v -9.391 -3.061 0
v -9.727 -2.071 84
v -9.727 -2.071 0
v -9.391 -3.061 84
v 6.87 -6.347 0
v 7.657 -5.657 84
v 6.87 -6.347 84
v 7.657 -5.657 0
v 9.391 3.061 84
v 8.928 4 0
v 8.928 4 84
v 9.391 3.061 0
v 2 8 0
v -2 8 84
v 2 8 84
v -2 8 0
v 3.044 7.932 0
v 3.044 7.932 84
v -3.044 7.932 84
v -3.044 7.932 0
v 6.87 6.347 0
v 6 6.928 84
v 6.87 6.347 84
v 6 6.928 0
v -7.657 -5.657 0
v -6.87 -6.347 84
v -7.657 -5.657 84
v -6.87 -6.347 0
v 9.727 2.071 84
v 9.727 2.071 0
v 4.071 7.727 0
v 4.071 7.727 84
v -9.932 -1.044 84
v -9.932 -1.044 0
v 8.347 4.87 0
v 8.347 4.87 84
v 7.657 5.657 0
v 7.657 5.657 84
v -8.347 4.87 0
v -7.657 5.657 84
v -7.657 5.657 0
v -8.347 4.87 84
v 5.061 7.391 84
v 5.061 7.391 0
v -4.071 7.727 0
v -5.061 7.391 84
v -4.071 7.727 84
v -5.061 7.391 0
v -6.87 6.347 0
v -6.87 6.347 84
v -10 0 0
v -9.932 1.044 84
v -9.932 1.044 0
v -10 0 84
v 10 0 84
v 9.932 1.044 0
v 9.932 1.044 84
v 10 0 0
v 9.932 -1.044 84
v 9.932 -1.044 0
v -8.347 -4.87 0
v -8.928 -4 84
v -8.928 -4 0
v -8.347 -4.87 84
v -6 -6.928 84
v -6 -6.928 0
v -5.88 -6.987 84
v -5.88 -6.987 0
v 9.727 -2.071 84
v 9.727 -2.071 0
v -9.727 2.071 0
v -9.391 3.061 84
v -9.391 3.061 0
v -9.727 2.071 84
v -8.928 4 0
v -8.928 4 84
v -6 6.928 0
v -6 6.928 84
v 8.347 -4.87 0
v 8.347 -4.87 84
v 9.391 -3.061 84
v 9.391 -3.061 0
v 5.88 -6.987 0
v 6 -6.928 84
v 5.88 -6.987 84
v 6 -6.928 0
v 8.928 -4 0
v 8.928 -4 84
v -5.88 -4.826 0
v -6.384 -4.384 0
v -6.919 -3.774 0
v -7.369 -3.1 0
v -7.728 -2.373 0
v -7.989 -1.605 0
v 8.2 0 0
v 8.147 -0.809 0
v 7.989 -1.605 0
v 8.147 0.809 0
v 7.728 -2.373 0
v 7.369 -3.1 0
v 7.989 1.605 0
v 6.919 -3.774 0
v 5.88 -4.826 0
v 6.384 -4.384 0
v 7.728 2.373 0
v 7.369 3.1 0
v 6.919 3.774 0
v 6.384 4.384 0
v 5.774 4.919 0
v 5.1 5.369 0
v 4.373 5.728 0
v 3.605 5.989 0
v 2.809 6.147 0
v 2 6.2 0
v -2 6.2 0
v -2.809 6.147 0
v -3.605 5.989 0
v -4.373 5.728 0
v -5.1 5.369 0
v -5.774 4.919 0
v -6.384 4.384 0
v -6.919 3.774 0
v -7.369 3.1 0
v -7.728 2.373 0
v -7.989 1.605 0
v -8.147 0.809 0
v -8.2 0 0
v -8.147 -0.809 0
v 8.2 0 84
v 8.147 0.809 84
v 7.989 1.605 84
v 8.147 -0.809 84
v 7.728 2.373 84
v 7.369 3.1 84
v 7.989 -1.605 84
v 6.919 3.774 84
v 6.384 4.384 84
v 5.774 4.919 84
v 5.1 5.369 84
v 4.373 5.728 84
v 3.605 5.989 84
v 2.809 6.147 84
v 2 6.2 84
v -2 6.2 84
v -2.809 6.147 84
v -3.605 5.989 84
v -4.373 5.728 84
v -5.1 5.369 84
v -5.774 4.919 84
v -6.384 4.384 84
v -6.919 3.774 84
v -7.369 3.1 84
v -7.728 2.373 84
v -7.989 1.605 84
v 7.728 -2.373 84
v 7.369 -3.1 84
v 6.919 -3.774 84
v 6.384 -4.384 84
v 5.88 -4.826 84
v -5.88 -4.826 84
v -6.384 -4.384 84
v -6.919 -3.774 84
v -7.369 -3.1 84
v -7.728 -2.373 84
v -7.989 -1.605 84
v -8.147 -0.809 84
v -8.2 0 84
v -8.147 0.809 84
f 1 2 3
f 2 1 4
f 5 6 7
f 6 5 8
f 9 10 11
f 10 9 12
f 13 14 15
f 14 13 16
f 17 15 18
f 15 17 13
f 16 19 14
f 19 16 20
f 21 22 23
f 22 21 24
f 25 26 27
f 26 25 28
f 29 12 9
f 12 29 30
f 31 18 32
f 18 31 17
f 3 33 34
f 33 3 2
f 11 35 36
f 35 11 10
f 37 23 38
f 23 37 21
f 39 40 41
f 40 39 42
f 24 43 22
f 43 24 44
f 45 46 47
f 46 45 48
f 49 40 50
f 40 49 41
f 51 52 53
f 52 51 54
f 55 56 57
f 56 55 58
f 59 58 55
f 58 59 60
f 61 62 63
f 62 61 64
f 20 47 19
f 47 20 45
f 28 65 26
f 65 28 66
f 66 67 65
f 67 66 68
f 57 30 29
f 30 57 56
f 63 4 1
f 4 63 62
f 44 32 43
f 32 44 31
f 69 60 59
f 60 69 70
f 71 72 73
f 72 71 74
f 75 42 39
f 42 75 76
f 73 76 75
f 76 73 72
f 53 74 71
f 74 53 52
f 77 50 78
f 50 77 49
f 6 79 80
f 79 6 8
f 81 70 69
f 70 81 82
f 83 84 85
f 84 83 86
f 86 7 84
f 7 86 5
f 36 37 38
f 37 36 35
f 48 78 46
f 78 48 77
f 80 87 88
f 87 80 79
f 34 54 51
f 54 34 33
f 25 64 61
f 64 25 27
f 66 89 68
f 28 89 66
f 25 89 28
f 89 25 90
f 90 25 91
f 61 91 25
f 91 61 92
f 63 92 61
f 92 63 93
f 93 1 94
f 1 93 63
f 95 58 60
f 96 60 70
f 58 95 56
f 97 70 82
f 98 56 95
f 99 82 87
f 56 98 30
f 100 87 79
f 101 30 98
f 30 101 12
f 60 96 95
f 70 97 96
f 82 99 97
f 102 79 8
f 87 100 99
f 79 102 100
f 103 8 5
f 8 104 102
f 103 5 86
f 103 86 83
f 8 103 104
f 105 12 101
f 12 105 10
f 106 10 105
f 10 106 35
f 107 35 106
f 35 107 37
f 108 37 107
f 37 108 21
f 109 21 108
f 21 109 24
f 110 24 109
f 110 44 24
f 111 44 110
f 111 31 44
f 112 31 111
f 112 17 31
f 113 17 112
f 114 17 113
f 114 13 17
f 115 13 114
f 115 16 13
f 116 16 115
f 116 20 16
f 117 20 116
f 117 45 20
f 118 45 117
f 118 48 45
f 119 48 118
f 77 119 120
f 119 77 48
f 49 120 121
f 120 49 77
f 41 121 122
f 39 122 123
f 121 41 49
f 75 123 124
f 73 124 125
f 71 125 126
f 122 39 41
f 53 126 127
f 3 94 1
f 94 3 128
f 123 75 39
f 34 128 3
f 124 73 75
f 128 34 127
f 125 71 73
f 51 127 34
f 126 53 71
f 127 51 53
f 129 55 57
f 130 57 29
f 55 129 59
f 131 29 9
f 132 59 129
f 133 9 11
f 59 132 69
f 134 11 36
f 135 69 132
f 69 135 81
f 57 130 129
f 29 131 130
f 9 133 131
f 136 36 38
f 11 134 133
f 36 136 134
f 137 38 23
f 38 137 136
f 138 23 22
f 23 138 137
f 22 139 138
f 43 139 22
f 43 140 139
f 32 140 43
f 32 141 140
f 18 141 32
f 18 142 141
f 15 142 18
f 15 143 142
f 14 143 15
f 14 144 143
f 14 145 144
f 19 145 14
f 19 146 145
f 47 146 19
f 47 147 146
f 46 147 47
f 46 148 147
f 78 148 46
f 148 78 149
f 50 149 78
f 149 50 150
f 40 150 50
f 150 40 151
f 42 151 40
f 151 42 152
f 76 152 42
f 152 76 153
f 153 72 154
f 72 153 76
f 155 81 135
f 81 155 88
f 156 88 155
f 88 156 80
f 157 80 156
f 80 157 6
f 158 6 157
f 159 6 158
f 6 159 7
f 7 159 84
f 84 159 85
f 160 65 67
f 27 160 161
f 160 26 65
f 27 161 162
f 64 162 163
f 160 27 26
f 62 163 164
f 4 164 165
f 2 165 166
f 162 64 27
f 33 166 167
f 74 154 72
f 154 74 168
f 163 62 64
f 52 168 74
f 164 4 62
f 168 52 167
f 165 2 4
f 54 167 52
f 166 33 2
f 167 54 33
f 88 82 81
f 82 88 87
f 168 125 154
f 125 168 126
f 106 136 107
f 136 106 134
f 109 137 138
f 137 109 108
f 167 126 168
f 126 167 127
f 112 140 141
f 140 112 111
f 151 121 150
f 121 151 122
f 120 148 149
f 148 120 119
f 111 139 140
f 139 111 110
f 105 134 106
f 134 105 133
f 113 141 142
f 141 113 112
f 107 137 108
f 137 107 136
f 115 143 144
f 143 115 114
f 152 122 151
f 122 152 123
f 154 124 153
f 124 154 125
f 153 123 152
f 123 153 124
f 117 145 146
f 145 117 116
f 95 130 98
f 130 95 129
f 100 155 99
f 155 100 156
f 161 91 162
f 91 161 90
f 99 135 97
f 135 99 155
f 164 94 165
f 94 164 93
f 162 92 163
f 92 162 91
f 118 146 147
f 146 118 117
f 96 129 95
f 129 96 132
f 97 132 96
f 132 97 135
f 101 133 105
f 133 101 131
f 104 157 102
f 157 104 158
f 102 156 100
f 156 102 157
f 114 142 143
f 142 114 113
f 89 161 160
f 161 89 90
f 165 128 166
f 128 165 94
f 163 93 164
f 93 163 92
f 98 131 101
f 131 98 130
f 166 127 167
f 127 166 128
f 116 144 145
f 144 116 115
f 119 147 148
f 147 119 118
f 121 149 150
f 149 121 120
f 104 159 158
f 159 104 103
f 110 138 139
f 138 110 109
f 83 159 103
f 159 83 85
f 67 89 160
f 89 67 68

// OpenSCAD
// file: params.scad
// ==================== source of truth ====================
// Every number below is cross-referenced to either this repo's own simulation
// model (src/robot_cat_description/urdf/cat.urdf.xacro at scale 1.0, and
// robot_cat_gait/leg_ik.py) or to a measurement of a real CAD file - see
// hardware/cad/measure/README.md for the method, the sources and the raw
// numbers.
//
// Nothing here is a guess any more. The two values that used to be flagged
// ADJUSTABLE (the horn bolt circle and a downloaded bracket's flange) were
// replaced by measurements taken off the official STS3215 STEP model, so the
// downloaded bracket is no longer on the critical path at all.

// ---- leg geometry - VERIFIED, must match leg_ik.py exactly ----
thigh_length = 110;   // LegGeometry.thigh_length, axis to axis
calf_length  = 110;   // LegGeometry.calf_length, axis to paw centre
hip_offset   = 25;    // hip roll axis -> thigh pitch axis, lateral
foot_radius  = 12;    // paw pad sphere radius

// ---- trunk geometry - VERIFIED ----
hip_x = 110;          // hip mount, x from body centre (so 220mm hip-to-hip)
hip_y = 55;           // hip mount, y from body centre (so 110mm hip-to-hip)
body_length = 300;
body_width  = 111;
body_height = 141;

// ---- ST3215 / STS3215 servo - MEASURED from the official CAD model
// (TheRobotStudio/SO-ARM100, STEP/SO100/STS3215_03a.step). The shop pages'
// "45.2 x 24.7 x 35" is the CASE only; the model bounding box is 39.6 deep
// because the output boss and the idler boss stand proud of it. Pocket depth
// must use servo_h, clearance above it must allow for servo_boss. ----
servo_l = 45.4;
servo_w = 24.8;
servo_h = 35.4;        // case alone, faces at +/-17.7 from centre
servo_boss_h = 2.3;    // output boss above the case face
servo_boss_d = 22.1;   // raised collar around the output axis, +0.1 clearance
servo_axis_x = 12.5;   // output axis offset from the servo's own centre,
                       // i.e. 10.2mm in from the near end face
servo_fit = 0.4;       // FDM clearance added per side around the pocket

// ---- Raspberry Pi 5 mounting - VERIFIED against the official Raspberry Pi
// Ltd mechanical drawing (RP-008347-DS-1): 58 x 49mm hole spacing, Ø2.7mm
// holes (clearance for M2.5) ----
pi_hole_x = 58;
pi_hole_y = 49;
pi_hole_d = 2.9;       // add a touch over the datasheet 2.7 for FDM tolerance

// ---- servo horn bolt circle - MEASURED, exact
// Four holes, all on ONE circle of radius 7.000mm (diameter 14.00), at 45,
// 135, 225 and 315 degrees - a square of side 9.90mm. Least-squares circle
// fit to the STEP model's analytic CIRCLE entities, residual 0.000mm.
//
// The earlier "three holes at 6.7, one at 5.6" here was wrong. It came from
// misreading OpenRoboticDog's hip_x4.stl, which has no horn circle at all -
// those were the servo's case screws. See measure/README.md.
horn_bolt_r = 7.0;
horn_bolt_d = 2.7;         // M2.5 clearance, model bore is 2.5
horn_hub_d = 9.2;          // Ø9.0 hub on the horn face, +0.2 clearance

// ---- servo case screw positions - MEASURED
// The four screws that hold the servo case together double as mounting
// points: this is how OpenRoboticDog fixes the servo to its frame, and that
// part measures 3.75mm apart against this model's 3.8mm. Positions are given
// relative to the servo centre, on both flanks at y = +/-10.25.
case_screw_y = 10.25;
case_screw_x = [4.2, -16.5, -20.3];
case_screw_d = 2.2;        // M2 clearance; the servo's own bore is 1.5 pilot

// Two of the three are enough to fix a servo, and OpenRoboticDog uses two.
// Which two matters here: taking the pair NEAREST the output axis keeps a
// mounting pad 35mm long instead of 45mm, which is what lets the trunk frame
// stay inside the 300mm body. The outermost screw stays available if a part
// wants all three.
case_screw_x_used = [4.2, -16.5];

// ---- leg segment spines ----
// The rectangular bar between a segment's two end plates. Declared here
// because FOUR files need it and only agreement makes them fit: the segment
// itself, and the cosmetic fairing that snaps over it. A comment saying
// "must match" is not a mechanism.
thigh_spine = [14, 10];
calf_spine  = [12, 9];

// ---- print structure ----
wall = 4;             // load-bearing wall thickness in PETG
insert_d = 4.2;        // M3 brass heat-set insert bore
insert_depth = 6;
$fn = 48;
// file: shell_params.scad
// ==================== cosmetic layer ====================
// The skin. Everything here is APPEARANCE, deliberately kept in its own file
// and its own namespace so that nothing structural can be changed by tuning
// how the cat looks. params.scad carries the numbers the gait and the torque
// budget depend on; this file must read them and never contradict them.
//
// The one hard constraint the skin has to respect was measured, not guessed:
// sweeping every pose the robot actually commands (walk at 0.10 m/s, full
// turn, stand, stretch, lie down), the nearest any leg part comes to the
// centreline is |y| = 84.6mm, against a body half-width of 55.5mm. That is
// 29mm of clearance, so a full-width skin never touches a leg. Only the four
// hip joints pierce it. Re-run measure/envelope.py after any gait change.

include <params.scad>

// ---- skin ----
skin = 1.8;           // cosmetic wall. Not load bearing - the ladder frame
                      // carries everything. 1.8 is three 0.6 extrusions.
seam_gap = 0.25;      // clearance on a shell-to-shell mating face
clip_d = 3.2;         // magnet / M3 boss for holding panels on

// ---- body ----
// Half-width comes straight from body_width so the skin can never quietly
// outgrow the box the torque was computed on. The vertical scale turns the
// circular stations below into the cat's egg-shaped cross-section: taller
// than wide, which montaz.pdf calls out as the thing to preserve.
body_hw = body_width / 2;              // 55.5
body_hh = body_height / 2;             // 70.5
body_z_scale = body_hh / body_hw;      // 1.27

// Stations along the spine: [x, radius, z-lift]. Radius is in circular
// space, BEFORE the vertical scale; lift is in real mm, after it. The shape
// comes mostly from the radius profile - the lifts only tilt the ends up.
//
// These are sphere CENTRES, not points on the surface: a station puts skin
// at x +/- r, not at x. Sizing them as if they were surface points is what
// makes a 300mm body come out 356mm long, so every station is checked
// against the box by measure/fit_check.py. Run it after touching this list.
// The box is 300 x 111 x 141 because that is what the torque budget and the
// gait were computed on, and the skin has to stay inside it.
body_stations = [
    [-124,  26,  12],   // tail root, lifted so the tail leaves upward
    [-106,  44,   6],   // rump, just behind the rear hips
    [ -70,  52,   1],   // waist - the shallowest part of the back
    [   0,  54.5,  0],  // midpoint
    [  70,  54.5, -1],  // ribcage, the deepest part of a cat
    [ 102,  47,   2],   // shoulder
    [ 120,  30,  12],   // base of the neck
];

// Where the skin is cut into printable pieces. The seam runs along the flank
// exactly at the hip axis (z=0 in the urdf's base_link). That is the widest
// line on the body, which makes it the one place a panel line can run
// straight without wandering across a curve - and it means each hip opening
// is a clean half-circle shared between the top and bottom panel, so either
// can be lifted off without threading it over a leg.
flank_seam_z = 0;
body_split_x = 0;     // fore/aft print split, keeps each panel under 155mm

// The urdf hangs neck_pan_joint and tail_joint off the CORNERS of the
// collision box, at z = +70.5. A rounded skin cannot reach a box corner, and
// nothing in the mass or torque budget depends on where those two decorative
// links attach - neck_mass is deliberately near-zero and the tail is trim.
// So the real pivots go where the skin actually is, and the numbers are
// stated here rather than left to be discovered with a printed part in hand.
neck_pivot = [138, 0, 30];
neck_rise = 34;       // degrees the neck leaves the chest at
neck_reach = 34;      // pivot to head centre, along that neck axis
head_droop = 8;       // nose-down at rest, which is how a cat holds it
tail_pivot = [-148, 0, 34];
tail_rise = 51.6;     // degrees above horizontal, matches the urdf's rpy

// ---- head ----
// Sized off the body, not invented: a domestic cat's skull is about 60% of
// the chest width across the cheeks. The muzzle is short and the eyes sit
// forward, which is most of what makes a face read as feline rather than
// canine.
// 72mm across a 109mm body is 66% - the proportion the reference render
// has. At 60% the head reads as a bird's; much over 70% and it reads as a
// kitten's.
head_w = 72;
head_h = 66;
head_l = 84;

eye_d = 15;           // outer lens/bezel diameter
eye_spacing = 34;     // centre to centre - 52% of head width, which is the
                      // proportion that reads as a cat rather than a fox
eye_x = 16;           // forward of the head centre
eye_z = 6;            // above the head centre
eye_toe_in = 12;      // degrees each eye is splayed outward

// Camera Module 3 board, from the Raspberry Pi mechanical drawing: 25 x 24mm
// board, 12.5mm lens barrel. It sits behind ONE eye - the other socket takes
// the IR illuminator, per plan-zakupowy.pdf.
cam_board = [25, 24, 11.5];
cam_bore_d = 16;

ear_h = 32;
ear_w = 29;
ear_t = 3.6;
ear_splay = 20;       // degrees outward from vertical
ear_x = -6;           // behind the head centre
ear_spacing = 40;
// Where the ear's own origin sits on the skull. head_upper cuts its socket
// with the same transform, so the socket and the plug cannot drift apart.
ear_seat_z = 26;

// Where the head splits. head_upper and head_lower both cut on this plane
// from opposite sides, so it has to be one number, not two that agree.
head_split_z = -6;
ear_tang = 13;

// ---- legs ----
// The round disc over every joint is the strongest visual signature in the
// reference image, and it is nearly free: it hides the horn screws and the
// gap between segments. Diameter follows the servo's own collar so it always
// looks deliberate.
cap_d = servo_boss_d + 12;      // 34.1
cap_h = 4.5;

fairing_gap = 1.2;    // clearance between a fairing and the segment inside it

// ---- tail ----
// Segments thread onto a single 2mm steel wire or a spring, tapering from
// root to tip. Eleven of them over 190mm reads as a cat tail; fewer looks
// like an antenna. The tail is driven by one microservo at the root, so the
// segments themselves are passive and only need to be light.
tail_n = 11;
tail_len = 190;
tail_root_d = 17;
tail_tip_d = 8;
tail_bore_d = 2.6;    // 2mm wire plus fit

// ---- neck ----
neck_d = 34;
neck_len = 26;
// main file
// Oslona uda, x4. A C-section that snaps over the thigh segment's spine and
// turns a 14 x 10mm bar into the rounded limb the reference image shows.
//
// It clips rather than bolts, and it is deliberately short of the end plates
// at both ends: the joint caps cover those, and leaving a gap means the
// fairing never fouls a horn screw.
include <shell_lib.scad>

spine_w = thigh_spine[0];   // params.scad, shared with the segment
spine_h = thigh_spine[1];
fair_len = 84;

module thigh_fairing() { limb_fairing(spine_w, spine_h, fair_len); }

thigh_fairing();
